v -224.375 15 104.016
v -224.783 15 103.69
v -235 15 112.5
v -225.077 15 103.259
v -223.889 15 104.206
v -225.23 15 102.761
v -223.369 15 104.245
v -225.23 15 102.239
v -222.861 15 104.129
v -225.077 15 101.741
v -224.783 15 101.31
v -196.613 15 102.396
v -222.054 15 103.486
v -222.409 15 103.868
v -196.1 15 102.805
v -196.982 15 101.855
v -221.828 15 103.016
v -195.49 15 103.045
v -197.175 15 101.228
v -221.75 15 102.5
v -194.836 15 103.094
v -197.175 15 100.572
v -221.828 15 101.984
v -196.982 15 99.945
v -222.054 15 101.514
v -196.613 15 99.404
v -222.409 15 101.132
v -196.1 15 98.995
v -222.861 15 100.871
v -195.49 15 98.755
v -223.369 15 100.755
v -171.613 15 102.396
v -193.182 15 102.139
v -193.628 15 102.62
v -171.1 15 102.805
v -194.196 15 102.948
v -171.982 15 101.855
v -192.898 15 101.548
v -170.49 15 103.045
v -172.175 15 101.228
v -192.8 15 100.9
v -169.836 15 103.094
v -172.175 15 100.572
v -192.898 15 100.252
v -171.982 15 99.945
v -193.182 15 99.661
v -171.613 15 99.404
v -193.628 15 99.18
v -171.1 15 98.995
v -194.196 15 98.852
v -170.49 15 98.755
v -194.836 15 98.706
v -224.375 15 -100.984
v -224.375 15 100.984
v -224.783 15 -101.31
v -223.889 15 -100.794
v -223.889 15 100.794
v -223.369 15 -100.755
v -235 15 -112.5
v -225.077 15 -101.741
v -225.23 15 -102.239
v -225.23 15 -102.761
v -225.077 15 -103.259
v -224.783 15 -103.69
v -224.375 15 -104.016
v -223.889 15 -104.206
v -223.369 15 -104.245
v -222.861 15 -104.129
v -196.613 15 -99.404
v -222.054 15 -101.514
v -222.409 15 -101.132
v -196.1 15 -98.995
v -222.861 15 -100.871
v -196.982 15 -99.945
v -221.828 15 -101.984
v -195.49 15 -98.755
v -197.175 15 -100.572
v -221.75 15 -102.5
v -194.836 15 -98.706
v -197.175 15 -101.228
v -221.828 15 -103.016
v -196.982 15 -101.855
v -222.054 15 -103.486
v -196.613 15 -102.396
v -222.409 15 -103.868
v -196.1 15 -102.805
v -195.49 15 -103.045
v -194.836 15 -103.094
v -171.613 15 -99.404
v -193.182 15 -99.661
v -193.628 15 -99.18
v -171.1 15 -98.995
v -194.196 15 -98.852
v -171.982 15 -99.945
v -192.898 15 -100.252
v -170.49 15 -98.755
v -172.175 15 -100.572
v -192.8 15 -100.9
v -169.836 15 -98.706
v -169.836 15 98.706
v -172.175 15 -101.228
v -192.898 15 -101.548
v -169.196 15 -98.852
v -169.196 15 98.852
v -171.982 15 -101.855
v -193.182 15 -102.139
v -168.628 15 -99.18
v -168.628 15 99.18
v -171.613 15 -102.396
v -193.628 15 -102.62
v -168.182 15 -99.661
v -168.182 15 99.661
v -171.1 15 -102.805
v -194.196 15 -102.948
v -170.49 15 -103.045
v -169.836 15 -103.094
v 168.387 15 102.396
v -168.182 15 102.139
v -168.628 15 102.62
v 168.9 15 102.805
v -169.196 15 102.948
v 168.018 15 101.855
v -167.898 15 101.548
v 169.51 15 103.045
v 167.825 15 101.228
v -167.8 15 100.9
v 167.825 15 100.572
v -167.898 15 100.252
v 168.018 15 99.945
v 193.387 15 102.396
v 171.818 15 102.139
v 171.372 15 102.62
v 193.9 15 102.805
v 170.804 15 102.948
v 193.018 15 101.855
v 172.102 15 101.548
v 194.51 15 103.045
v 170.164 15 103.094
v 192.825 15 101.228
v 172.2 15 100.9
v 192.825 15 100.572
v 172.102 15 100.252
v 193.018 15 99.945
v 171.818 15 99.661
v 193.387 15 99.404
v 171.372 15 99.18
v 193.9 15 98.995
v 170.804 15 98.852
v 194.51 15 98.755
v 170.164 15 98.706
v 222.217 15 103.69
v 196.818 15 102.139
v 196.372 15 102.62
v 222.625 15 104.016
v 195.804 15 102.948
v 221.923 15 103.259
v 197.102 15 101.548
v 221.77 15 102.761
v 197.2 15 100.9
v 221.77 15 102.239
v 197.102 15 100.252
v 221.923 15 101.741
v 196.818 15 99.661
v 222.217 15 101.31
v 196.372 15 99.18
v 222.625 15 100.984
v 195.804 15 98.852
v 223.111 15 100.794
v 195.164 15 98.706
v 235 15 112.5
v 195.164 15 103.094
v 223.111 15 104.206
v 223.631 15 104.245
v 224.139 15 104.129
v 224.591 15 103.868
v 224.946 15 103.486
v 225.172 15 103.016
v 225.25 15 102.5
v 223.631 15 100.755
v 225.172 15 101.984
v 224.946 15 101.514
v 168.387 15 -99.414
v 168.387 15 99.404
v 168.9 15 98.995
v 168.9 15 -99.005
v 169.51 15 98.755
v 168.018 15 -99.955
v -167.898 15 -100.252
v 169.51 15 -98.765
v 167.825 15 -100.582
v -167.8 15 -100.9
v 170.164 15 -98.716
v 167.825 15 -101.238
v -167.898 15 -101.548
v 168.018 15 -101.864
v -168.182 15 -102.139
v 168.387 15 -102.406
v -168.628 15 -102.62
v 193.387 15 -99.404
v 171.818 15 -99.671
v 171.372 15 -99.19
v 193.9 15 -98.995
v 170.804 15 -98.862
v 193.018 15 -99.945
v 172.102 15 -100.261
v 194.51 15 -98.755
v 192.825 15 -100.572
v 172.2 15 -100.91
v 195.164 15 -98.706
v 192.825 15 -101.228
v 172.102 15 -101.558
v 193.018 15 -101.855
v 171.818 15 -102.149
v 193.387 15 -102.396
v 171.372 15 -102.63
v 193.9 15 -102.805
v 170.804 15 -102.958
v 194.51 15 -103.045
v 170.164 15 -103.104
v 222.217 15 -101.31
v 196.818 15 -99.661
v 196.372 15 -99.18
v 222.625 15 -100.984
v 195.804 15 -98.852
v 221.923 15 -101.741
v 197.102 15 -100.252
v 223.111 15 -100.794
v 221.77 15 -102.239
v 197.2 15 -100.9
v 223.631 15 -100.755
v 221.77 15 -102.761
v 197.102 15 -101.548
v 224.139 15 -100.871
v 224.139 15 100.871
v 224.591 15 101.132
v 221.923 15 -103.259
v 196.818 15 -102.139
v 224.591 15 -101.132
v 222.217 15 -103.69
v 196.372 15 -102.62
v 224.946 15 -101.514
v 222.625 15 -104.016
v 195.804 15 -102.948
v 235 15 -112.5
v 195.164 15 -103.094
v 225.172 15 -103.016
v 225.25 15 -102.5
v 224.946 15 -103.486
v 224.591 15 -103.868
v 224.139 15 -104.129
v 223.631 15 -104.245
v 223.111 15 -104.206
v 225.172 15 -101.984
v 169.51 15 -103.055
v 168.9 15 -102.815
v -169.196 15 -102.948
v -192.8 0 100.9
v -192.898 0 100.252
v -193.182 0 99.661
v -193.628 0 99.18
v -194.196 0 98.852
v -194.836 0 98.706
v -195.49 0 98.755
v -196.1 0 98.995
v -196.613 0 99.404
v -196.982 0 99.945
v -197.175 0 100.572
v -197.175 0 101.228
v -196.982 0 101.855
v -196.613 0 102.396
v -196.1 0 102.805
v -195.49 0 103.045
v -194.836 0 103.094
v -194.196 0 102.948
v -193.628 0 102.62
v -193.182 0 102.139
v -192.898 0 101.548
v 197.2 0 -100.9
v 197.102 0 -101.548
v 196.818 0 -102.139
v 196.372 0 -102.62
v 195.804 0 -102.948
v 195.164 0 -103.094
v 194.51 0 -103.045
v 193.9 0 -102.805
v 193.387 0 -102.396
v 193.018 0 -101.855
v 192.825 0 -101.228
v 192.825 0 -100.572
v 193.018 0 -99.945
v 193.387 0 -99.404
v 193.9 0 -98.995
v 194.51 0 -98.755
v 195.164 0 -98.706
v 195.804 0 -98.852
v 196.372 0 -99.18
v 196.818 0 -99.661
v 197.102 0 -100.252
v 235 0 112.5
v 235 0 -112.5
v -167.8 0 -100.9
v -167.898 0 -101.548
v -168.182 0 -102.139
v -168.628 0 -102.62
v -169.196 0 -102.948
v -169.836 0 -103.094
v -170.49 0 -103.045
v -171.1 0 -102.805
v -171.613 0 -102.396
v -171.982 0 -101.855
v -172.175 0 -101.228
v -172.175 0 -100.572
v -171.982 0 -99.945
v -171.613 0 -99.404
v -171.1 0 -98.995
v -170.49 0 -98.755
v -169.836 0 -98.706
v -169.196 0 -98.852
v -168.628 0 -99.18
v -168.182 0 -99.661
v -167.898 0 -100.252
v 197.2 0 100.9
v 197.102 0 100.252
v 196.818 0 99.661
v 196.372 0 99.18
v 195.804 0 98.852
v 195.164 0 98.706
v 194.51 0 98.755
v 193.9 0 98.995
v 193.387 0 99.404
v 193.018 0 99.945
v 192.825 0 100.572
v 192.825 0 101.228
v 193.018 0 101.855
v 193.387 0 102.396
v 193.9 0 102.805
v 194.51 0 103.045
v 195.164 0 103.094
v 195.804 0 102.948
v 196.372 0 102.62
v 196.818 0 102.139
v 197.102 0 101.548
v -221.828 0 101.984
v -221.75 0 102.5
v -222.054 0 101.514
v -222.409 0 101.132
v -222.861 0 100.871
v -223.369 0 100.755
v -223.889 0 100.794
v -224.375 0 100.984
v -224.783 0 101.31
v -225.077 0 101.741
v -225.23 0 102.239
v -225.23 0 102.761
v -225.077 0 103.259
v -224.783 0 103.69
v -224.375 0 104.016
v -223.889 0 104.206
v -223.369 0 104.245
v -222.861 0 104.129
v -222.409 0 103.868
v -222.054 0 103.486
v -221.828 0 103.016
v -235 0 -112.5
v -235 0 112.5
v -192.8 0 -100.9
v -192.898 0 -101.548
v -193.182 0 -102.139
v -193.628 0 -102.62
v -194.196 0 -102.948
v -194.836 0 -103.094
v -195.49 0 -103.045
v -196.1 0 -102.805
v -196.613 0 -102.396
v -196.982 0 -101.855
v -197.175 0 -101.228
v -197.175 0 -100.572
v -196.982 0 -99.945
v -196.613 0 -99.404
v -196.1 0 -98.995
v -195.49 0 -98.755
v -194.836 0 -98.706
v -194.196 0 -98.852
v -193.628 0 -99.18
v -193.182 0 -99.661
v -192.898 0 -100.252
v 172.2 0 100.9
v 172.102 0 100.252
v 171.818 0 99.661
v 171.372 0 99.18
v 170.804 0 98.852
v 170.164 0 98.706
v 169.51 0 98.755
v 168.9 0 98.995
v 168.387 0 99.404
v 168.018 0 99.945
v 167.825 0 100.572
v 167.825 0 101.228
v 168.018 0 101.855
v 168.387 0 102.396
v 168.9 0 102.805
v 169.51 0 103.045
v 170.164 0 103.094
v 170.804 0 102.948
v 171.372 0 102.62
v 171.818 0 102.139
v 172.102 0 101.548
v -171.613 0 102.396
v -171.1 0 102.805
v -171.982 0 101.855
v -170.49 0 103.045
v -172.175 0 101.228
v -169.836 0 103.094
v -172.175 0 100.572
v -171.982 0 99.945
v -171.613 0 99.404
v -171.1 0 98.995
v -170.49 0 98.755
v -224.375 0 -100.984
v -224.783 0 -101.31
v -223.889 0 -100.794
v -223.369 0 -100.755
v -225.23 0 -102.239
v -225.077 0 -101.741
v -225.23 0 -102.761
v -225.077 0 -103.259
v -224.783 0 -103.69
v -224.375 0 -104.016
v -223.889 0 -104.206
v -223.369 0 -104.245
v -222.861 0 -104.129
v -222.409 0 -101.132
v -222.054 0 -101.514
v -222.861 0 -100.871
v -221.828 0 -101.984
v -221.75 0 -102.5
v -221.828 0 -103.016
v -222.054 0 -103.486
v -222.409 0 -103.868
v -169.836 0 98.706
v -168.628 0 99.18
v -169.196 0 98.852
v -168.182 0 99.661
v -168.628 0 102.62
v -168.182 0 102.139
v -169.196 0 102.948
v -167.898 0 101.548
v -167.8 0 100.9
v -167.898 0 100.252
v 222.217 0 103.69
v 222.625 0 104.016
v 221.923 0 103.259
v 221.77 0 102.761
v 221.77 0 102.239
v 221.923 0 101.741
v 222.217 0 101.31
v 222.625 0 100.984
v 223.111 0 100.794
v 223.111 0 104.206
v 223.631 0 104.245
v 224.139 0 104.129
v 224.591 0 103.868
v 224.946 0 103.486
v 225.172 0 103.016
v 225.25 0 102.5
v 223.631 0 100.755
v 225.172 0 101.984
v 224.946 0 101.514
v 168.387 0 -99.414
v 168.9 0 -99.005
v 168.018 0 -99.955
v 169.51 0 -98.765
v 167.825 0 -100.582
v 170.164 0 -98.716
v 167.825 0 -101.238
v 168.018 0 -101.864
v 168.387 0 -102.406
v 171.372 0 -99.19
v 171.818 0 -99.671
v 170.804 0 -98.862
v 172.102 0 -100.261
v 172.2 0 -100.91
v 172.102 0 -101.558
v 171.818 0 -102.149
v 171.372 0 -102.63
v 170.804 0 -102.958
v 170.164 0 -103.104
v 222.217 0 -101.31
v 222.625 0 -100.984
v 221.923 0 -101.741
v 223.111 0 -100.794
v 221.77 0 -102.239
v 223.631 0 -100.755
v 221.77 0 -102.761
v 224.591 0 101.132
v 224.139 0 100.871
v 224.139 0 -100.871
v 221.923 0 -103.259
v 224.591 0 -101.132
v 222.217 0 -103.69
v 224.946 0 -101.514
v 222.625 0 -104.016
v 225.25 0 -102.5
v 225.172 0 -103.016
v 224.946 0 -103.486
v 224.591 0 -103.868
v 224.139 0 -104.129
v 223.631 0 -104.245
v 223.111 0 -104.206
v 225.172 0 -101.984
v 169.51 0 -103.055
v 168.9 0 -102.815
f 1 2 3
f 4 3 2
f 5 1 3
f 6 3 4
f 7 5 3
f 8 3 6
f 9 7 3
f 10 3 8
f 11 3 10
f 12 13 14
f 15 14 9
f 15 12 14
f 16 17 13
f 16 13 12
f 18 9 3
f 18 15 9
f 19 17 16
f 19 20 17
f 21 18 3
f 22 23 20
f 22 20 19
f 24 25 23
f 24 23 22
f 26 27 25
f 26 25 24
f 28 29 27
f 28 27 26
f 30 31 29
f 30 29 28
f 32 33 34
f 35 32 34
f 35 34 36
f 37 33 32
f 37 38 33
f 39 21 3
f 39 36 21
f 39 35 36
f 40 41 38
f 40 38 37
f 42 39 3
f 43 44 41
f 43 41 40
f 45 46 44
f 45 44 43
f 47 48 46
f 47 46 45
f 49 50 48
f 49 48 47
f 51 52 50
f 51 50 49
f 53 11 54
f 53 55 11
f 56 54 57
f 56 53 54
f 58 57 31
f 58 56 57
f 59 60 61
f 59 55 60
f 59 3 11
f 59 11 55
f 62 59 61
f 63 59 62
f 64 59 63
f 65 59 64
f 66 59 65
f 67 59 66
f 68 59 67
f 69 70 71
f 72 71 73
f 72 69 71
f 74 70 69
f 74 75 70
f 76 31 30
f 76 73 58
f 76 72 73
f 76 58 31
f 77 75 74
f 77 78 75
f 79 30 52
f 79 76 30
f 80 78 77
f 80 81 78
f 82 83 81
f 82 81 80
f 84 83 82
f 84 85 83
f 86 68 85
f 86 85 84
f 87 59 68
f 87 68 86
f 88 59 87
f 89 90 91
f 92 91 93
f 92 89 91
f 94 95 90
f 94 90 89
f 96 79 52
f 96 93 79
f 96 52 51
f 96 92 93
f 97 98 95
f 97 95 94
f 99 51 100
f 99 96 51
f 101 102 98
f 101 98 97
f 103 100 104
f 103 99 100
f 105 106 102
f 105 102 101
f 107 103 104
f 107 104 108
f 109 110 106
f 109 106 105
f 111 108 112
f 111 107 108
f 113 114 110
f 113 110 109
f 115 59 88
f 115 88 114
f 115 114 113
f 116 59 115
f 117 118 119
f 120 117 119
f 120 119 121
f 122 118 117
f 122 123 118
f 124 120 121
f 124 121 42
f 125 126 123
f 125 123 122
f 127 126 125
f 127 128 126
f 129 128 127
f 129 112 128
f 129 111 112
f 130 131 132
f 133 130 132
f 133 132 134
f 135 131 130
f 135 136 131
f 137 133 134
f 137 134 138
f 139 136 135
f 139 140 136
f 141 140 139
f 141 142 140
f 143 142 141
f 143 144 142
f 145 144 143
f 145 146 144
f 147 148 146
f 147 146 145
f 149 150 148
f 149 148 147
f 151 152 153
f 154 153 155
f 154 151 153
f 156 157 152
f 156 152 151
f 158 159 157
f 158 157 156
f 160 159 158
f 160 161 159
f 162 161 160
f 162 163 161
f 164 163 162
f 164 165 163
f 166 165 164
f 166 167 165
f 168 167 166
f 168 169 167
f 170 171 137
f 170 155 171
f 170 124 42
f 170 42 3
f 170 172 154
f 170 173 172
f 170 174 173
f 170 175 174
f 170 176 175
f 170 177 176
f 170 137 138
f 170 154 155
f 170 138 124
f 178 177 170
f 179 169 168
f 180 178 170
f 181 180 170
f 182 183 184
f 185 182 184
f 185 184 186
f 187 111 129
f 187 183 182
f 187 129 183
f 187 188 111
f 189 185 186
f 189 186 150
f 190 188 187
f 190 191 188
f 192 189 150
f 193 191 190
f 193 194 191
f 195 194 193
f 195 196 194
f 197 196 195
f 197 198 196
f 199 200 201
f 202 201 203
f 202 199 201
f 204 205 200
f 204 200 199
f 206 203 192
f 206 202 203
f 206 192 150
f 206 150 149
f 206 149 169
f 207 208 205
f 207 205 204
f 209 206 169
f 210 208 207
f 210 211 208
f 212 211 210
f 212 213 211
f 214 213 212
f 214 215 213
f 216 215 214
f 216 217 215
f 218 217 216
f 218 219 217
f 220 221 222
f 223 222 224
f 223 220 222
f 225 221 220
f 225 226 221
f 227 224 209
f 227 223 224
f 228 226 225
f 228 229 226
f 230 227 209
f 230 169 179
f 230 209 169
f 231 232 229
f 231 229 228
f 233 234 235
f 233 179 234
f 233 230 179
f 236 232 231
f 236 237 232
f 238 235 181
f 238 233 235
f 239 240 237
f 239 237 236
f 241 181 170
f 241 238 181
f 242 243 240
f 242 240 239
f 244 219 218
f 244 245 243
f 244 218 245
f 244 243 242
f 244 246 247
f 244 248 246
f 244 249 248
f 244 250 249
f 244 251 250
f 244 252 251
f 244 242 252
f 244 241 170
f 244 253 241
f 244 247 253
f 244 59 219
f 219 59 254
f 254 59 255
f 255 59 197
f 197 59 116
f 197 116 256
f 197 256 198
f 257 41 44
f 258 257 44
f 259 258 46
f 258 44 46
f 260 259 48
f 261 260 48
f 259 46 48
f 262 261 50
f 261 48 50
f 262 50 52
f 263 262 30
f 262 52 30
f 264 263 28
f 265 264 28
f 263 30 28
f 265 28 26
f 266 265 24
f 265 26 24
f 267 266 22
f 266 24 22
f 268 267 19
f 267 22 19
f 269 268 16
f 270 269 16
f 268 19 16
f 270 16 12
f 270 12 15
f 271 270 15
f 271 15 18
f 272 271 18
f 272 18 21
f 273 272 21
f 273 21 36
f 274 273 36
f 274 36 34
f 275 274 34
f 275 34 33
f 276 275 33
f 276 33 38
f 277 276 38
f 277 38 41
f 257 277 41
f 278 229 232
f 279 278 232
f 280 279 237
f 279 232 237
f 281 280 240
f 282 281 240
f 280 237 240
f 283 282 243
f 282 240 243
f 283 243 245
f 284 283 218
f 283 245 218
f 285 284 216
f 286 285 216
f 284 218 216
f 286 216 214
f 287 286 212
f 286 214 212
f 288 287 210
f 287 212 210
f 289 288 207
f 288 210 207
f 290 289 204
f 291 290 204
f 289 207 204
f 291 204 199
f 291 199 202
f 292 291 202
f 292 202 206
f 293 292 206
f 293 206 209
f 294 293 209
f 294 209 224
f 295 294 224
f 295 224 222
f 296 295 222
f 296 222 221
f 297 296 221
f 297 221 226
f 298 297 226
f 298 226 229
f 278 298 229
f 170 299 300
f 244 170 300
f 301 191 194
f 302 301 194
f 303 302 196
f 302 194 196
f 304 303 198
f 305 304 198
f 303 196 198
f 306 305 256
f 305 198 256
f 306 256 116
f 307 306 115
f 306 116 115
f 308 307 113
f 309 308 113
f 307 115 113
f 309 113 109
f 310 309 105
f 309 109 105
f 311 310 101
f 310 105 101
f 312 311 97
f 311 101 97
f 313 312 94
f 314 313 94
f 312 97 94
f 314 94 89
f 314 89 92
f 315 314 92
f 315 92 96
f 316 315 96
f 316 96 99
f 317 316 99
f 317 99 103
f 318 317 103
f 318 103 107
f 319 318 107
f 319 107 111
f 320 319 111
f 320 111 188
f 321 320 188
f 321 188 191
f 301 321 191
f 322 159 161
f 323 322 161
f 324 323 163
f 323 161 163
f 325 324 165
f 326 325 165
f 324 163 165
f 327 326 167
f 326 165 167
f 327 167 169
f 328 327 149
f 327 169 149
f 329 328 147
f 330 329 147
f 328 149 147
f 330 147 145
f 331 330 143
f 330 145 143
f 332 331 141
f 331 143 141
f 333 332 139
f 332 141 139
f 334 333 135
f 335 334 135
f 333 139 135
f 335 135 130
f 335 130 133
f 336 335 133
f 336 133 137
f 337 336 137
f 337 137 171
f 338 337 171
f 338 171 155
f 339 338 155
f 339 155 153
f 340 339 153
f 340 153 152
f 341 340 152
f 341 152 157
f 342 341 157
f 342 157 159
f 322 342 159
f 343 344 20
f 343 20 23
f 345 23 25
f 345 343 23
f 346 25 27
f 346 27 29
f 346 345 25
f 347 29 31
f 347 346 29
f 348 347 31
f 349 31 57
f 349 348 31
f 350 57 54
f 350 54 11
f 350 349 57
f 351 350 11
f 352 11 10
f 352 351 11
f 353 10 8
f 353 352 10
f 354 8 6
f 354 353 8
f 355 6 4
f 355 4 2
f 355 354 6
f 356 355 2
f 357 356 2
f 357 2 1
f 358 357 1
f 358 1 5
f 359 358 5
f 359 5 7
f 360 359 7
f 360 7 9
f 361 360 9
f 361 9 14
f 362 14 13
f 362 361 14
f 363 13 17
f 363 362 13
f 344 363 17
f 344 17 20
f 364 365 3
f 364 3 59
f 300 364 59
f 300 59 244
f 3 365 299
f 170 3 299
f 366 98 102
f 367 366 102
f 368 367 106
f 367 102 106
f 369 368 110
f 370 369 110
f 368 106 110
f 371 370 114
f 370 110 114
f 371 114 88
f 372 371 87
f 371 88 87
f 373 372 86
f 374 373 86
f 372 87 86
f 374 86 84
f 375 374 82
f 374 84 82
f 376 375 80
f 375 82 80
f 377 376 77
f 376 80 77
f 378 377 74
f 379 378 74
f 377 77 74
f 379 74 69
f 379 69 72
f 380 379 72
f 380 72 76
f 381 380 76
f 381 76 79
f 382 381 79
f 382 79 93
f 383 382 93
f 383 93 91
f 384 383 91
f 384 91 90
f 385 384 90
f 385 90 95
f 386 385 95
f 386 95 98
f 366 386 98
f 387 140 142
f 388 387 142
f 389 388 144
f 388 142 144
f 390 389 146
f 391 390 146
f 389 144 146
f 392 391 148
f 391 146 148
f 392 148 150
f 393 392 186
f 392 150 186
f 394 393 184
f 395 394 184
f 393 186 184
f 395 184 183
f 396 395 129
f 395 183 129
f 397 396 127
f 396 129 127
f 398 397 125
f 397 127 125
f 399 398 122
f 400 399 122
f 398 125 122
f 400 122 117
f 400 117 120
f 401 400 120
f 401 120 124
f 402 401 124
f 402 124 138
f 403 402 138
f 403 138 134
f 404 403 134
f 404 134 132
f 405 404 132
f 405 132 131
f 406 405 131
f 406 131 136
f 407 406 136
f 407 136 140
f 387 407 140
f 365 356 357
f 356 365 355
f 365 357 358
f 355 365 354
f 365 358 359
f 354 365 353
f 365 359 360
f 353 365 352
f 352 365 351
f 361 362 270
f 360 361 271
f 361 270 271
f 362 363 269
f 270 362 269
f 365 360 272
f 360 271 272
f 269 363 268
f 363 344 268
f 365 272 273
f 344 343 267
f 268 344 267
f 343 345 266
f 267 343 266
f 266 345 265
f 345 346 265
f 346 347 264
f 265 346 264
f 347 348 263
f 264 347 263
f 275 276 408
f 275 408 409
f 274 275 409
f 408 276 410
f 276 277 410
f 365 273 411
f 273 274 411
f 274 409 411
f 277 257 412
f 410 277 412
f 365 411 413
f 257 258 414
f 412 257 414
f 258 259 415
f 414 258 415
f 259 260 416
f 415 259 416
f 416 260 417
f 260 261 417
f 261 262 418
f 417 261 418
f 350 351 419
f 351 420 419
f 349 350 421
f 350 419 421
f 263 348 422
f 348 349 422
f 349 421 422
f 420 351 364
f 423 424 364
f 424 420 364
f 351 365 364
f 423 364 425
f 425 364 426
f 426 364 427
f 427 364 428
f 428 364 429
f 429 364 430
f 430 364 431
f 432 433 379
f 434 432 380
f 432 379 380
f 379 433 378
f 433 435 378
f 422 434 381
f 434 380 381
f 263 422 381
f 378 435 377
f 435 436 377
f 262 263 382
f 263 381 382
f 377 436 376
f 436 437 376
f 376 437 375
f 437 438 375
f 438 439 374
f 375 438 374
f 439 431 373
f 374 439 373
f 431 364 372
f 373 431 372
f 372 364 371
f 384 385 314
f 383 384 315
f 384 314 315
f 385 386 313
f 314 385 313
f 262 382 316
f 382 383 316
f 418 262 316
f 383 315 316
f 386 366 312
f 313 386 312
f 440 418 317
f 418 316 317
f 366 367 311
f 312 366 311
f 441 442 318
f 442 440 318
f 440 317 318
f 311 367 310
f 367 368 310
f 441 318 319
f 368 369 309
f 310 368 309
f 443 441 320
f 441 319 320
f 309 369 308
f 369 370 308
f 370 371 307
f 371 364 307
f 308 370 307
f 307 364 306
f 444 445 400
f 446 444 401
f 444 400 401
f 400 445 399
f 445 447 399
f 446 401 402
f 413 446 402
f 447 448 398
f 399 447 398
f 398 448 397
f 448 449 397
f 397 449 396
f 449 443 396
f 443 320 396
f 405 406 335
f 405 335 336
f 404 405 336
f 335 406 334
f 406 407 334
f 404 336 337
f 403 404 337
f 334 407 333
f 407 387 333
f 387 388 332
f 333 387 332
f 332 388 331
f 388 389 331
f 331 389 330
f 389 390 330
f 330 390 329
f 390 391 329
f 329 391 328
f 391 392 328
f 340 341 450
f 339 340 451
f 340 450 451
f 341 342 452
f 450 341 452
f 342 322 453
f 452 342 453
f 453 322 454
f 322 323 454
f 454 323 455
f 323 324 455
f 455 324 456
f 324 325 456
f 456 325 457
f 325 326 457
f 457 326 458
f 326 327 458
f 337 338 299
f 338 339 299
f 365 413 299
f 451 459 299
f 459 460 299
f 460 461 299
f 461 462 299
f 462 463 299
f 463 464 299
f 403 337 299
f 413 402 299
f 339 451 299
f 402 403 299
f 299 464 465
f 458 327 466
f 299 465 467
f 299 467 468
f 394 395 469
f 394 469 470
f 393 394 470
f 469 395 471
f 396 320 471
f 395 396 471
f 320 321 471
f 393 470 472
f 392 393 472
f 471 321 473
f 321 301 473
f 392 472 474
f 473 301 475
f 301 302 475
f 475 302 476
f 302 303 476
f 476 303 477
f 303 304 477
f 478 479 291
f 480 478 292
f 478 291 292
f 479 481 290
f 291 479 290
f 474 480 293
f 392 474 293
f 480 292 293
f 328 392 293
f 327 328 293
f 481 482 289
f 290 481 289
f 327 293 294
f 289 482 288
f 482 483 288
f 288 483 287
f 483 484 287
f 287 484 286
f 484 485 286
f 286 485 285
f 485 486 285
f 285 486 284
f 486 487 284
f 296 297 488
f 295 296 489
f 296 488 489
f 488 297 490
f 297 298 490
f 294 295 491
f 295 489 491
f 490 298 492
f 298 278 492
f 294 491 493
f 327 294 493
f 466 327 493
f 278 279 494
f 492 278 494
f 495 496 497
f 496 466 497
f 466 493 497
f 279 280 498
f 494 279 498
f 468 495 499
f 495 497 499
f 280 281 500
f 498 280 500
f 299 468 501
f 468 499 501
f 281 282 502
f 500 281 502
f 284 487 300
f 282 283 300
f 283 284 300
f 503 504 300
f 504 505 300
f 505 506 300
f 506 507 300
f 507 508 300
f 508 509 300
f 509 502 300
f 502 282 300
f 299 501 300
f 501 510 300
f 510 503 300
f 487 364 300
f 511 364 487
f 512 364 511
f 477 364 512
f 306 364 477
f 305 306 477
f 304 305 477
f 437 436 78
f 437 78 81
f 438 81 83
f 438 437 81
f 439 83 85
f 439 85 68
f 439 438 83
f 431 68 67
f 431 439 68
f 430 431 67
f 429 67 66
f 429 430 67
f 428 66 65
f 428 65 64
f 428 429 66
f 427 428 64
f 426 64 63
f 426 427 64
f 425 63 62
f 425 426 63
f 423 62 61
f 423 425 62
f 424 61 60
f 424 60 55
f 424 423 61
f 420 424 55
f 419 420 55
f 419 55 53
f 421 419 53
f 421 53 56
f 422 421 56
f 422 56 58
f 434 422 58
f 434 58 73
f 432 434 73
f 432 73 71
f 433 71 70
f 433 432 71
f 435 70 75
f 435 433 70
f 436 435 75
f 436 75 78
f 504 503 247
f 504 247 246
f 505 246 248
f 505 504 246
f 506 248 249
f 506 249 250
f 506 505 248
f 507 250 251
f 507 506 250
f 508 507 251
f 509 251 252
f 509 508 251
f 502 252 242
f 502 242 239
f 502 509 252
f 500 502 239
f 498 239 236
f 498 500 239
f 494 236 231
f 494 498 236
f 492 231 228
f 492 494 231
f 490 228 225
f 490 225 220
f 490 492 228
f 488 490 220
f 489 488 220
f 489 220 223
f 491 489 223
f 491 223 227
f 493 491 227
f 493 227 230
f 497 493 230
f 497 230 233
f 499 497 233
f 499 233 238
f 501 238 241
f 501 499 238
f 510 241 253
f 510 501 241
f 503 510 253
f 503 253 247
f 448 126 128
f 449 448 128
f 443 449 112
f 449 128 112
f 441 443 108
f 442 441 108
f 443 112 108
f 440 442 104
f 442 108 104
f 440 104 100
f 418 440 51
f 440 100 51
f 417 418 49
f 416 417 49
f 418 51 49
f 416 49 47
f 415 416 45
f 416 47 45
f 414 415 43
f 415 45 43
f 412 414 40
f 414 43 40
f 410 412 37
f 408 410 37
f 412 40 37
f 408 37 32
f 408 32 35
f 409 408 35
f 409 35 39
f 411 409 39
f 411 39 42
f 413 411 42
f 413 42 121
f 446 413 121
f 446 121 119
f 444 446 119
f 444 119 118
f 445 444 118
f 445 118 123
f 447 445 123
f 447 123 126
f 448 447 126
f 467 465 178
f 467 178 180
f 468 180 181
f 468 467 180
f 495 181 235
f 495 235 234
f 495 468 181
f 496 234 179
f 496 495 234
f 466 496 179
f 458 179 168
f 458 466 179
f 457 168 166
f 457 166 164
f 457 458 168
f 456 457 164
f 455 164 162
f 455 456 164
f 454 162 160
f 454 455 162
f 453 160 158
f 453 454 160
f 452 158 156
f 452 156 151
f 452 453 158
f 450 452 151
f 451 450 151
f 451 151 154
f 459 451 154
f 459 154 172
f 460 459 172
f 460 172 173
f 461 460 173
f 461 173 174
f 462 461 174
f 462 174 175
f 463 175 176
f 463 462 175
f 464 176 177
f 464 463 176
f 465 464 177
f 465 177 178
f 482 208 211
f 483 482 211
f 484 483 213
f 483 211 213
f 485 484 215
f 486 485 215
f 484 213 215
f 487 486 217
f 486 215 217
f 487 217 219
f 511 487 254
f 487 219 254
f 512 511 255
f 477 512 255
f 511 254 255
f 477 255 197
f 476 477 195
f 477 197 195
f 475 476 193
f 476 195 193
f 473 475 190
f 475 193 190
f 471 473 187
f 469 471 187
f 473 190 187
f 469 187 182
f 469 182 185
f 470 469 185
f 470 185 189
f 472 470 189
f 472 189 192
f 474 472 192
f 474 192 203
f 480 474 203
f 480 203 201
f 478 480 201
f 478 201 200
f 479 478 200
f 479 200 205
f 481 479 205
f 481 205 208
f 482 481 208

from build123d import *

# Parameters (mm, degrees)
SKETCH2_W           = 470
SKETCH2_H           = 225
SKETCH2_R           = 1.75
BOSS_EXTRUDE1_DEPTH = 15
SKETCH3_R           = 2.2
CUT_EXTRUDE1_DEPTH  = 16
SKETCH4_R           = 2.2
CUT_EXTRUDE2_DEPTH  = 16


with BuildPart() as part:
    # Sketch2 → Boss-Extrude1 (new body)
    with BuildSketch(Plane(origin=(0, 0, 0), x_dir=(1, 0, 0), z_dir=(0, 1, 0))):
        Rectangle(SKETCH2_W, SKETCH2_H)
        with Locations((223.5, 102.5)):
            Circle(SKETCH2_R, mode=Mode.SUBTRACT)
        with Locations((223.5, -102.5)):
            Circle(SKETCH2_R, mode=Mode.SUBTRACT)
        with Locations((-223.5, -102.5)):
            Circle(SKETCH2_R, mode=Mode.SUBTRACT)
        with Locations((-223.5, 102.5)):
            Circle(SKETCH2_R, mode=Mode.SUBTRACT)
    extrude(amount=BOSS_EXTRUDE1_DEPTH)

    # Sketch3 → Cut-Extrude1 (cut, through all)
    with BuildSketch(Plane(origin=(0, 15, 0), x_dir=(1, 0, 0), z_dir=(0, 1, 0))):
        with Locations((-195, 100.9)):
            Circle(SKETCH3_R)
        with Locations((-170, 100.9)):
            Circle(SKETCH3_R)
        with Locations((195, 100.9)):
            Circle(SKETCH3_R)
        with Locations((170.000001969, 100.909922977)):
            Circle(SKETCH3_R)
    extrude(amount=-CUT_EXTRUDE1_DEPTH, mode=Mode.SUBTRACT)

    # Sketch4 → Cut-Extrude2 (cut, through all)
    with BuildSketch(Plane(origin=(0, 15, 0), x_dir=(1, 0, 0), z_dir=(0, 1, 0))):
        with Locations((-195, -100.9)):
            Circle(SKETCH4_R)
        with Locations((195, -100.9)):
            Circle(SKETCH4_R)
        with Locations((-170, -100.9)):
            Circle(SKETCH4_R)
        with Locations((170, -100.9)):
            Circle(SKETCH4_R)
    extrude(amount=-CUT_EXTRUDE2_DEPTH, mode=Mode.SUBTRACT)


solid = part.part
